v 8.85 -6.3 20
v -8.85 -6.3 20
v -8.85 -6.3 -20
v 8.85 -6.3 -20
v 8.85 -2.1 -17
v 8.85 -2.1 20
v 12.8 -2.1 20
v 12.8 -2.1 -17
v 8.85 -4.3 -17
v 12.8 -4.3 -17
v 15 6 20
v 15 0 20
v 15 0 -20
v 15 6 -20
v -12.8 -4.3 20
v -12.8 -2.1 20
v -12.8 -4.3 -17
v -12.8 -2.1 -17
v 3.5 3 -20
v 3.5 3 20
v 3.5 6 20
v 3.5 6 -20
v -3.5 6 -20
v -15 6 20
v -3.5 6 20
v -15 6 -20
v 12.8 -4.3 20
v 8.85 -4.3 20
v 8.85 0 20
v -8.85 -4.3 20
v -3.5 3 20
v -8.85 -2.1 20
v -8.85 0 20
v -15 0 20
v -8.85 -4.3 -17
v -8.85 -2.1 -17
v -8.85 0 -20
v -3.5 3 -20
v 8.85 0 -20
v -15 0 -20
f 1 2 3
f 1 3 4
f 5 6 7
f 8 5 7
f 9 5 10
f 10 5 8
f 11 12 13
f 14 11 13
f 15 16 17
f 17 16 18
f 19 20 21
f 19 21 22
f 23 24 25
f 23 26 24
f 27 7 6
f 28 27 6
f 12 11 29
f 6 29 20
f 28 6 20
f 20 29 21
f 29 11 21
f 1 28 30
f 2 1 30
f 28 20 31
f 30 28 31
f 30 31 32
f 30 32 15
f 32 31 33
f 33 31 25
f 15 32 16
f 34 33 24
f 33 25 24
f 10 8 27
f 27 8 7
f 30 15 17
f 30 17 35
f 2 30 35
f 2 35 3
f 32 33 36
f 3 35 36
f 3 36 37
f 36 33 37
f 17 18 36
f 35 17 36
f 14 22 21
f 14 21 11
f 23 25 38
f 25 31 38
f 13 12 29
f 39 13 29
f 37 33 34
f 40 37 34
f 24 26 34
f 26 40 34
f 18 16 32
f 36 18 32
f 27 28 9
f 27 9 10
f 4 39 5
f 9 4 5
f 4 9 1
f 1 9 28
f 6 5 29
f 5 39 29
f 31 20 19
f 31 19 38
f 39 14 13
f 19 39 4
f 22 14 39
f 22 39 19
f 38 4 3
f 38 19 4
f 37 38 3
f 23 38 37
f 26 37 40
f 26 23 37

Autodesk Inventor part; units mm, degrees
ref_plane "YZ Plane" through (0, 0, 0) normal (1, 0, 0) x (0, 1, 0)
ref_plane "XZ Plane" through (0, 0, 0) normal (0, 1, 0) x (-1, 0, 0)
ref_plane "XY Plane" through (0, 0, 0) normal (0, 0, 1) x (1, 0, 0)
sketch "Sketch1" plane through (0, 0, 0) normal (0, 1, 0) x (-1, 0, 0)
  line L0 (15, 20) -> (-15, 20)
  line L1 (-15, 20) -> (-15, -20)
  line L2 (-15, -20) -> (15, -20)
  line L3 (15, -20) -> (15, 20)
  line L4 (15, 20) -> (-15, -20) construction
  line L5 (-15, 20) -> (15, -20) construction
  point P0 (0, 0)
  dimension "d0" = 30
  dimension "d1" = 40
extrude "Extrusion1" add sketch "Sketch1" along normal blind 3
sketch "Sketch2" plane through (0, 3, 0) normal (0, 1, 0) x (1, 0, 0)
  line L0 (-15, 20) -> (-15, -20) projected
  line L1 (15, 20) -> (-15, 20) projected
  line L2 (-15, -20) -> (-3.5, -20)
  line L3 (-3.5, -20) -> (-3.5, 20)
  line L4 (-3.5, 20) -> (-15, 20)
  line L5 (-15, 20) -> (-15, -20)
  line L6 (15, -20) -> (3.5, -20)
  line L7 (3.5, -20) -> (3.5, 20)
  line L8 (3.5, 20) -> (15, 20)
  line L9 (15, 20) -> (15, -20)
  point P0 (0, 0)
  dimension "d4" = 7
  dimension "d5" = 3.5
  dimension "d6" = 15
extrude "Extrusion2" add sketch "Sketch2" along normal blind 3
sketch "Sketch3" plane through (0, 0, 0) normal (0, -1, 0) x (1, 0, 0)
  line L0 (15, -20) -> (-15, -20) projected
  line L1 (8.85, 20) -> (-8.85, 20)
  line L2 (-8.85, 20) -> (-8.85, -20)
  line L3 (-8.85, -20) -> (8.85, -20)
  line L4 (8.85, -20) -> (8.85, 20)
  line L5 (8.85, 20) -> (-8.85, -20) construction
  line L6 (-8.85, 20) -> (8.85, -20) construction
  point P0 (0, 0)
  dimension "d9" = 17.7
extrude "Extrusion3" add sketch "Sketch3" along normal blind 2.1
sketch "Sketch4" plane through (0, -2.1, 0) normal (0, -1, 0) x (1, 0, 0)
  line L0 (-8.85, -20) -> (-15, -20) projected
  line L1 (12.8, 20) -> (-12.8, 20)
  line L2 (-12.8, 20) -> (-12.8, -20)
  line L3 (-12.8, -20) -> (12.8, -20)
  line L4 (12.8, -20) -> (12.8, 20)
  line L5 (12.8, 20) -> (-12.8, -20) construction
  line L6 (-12.8, 20) -> (12.8, -20) construction
  line L7 (15, 20) -> (15, -20) projected
  line L8 (-12.8, -17) -> (12.8, -17)
  line L9 (8.85, -20) -> (8.85, 20) projected
  line L10 (8.85, -20) -> (8.85, -17)
  line L11 (-8.85, -20) -> (-8.85, -17)
  point P0 (0, 0)
  dimension "d12" = 2.2
  dimension "d15" = 3
extrude "Extrusion4" add sketch "Sketch4" along normal blind 2.2 contours L11 L8 L9 L3 | L8 L2 L1 L9 | L9 L1 L4 L8
sketch "Sketch5" plane through (0, -4.3, 0) normal (0, -1, 0) x (1, 0, 0)
  line L0 (-3.5, -20) -> (-15, -20) projected
  line L1 (8.85, 20) -> (-8.85, 20)
  line L2 (-8.85, 20) -> (-8.85, -20)
  line L3 (-8.85, -20) -> (8.85, -20)
  line L4 (8.85, -20) -> (8.85, 20)
  line L5 (8.85, 20) -> (-8.85, -20) construction
  line L6 (-8.85, 20) -> (8.85, -20) construction
  point P0 (0, 0)
  dimension "d16" = 17.7
extrude "Extrusion5" add sketch "Sketch5" along normal blind 2
properties part number "horok"
